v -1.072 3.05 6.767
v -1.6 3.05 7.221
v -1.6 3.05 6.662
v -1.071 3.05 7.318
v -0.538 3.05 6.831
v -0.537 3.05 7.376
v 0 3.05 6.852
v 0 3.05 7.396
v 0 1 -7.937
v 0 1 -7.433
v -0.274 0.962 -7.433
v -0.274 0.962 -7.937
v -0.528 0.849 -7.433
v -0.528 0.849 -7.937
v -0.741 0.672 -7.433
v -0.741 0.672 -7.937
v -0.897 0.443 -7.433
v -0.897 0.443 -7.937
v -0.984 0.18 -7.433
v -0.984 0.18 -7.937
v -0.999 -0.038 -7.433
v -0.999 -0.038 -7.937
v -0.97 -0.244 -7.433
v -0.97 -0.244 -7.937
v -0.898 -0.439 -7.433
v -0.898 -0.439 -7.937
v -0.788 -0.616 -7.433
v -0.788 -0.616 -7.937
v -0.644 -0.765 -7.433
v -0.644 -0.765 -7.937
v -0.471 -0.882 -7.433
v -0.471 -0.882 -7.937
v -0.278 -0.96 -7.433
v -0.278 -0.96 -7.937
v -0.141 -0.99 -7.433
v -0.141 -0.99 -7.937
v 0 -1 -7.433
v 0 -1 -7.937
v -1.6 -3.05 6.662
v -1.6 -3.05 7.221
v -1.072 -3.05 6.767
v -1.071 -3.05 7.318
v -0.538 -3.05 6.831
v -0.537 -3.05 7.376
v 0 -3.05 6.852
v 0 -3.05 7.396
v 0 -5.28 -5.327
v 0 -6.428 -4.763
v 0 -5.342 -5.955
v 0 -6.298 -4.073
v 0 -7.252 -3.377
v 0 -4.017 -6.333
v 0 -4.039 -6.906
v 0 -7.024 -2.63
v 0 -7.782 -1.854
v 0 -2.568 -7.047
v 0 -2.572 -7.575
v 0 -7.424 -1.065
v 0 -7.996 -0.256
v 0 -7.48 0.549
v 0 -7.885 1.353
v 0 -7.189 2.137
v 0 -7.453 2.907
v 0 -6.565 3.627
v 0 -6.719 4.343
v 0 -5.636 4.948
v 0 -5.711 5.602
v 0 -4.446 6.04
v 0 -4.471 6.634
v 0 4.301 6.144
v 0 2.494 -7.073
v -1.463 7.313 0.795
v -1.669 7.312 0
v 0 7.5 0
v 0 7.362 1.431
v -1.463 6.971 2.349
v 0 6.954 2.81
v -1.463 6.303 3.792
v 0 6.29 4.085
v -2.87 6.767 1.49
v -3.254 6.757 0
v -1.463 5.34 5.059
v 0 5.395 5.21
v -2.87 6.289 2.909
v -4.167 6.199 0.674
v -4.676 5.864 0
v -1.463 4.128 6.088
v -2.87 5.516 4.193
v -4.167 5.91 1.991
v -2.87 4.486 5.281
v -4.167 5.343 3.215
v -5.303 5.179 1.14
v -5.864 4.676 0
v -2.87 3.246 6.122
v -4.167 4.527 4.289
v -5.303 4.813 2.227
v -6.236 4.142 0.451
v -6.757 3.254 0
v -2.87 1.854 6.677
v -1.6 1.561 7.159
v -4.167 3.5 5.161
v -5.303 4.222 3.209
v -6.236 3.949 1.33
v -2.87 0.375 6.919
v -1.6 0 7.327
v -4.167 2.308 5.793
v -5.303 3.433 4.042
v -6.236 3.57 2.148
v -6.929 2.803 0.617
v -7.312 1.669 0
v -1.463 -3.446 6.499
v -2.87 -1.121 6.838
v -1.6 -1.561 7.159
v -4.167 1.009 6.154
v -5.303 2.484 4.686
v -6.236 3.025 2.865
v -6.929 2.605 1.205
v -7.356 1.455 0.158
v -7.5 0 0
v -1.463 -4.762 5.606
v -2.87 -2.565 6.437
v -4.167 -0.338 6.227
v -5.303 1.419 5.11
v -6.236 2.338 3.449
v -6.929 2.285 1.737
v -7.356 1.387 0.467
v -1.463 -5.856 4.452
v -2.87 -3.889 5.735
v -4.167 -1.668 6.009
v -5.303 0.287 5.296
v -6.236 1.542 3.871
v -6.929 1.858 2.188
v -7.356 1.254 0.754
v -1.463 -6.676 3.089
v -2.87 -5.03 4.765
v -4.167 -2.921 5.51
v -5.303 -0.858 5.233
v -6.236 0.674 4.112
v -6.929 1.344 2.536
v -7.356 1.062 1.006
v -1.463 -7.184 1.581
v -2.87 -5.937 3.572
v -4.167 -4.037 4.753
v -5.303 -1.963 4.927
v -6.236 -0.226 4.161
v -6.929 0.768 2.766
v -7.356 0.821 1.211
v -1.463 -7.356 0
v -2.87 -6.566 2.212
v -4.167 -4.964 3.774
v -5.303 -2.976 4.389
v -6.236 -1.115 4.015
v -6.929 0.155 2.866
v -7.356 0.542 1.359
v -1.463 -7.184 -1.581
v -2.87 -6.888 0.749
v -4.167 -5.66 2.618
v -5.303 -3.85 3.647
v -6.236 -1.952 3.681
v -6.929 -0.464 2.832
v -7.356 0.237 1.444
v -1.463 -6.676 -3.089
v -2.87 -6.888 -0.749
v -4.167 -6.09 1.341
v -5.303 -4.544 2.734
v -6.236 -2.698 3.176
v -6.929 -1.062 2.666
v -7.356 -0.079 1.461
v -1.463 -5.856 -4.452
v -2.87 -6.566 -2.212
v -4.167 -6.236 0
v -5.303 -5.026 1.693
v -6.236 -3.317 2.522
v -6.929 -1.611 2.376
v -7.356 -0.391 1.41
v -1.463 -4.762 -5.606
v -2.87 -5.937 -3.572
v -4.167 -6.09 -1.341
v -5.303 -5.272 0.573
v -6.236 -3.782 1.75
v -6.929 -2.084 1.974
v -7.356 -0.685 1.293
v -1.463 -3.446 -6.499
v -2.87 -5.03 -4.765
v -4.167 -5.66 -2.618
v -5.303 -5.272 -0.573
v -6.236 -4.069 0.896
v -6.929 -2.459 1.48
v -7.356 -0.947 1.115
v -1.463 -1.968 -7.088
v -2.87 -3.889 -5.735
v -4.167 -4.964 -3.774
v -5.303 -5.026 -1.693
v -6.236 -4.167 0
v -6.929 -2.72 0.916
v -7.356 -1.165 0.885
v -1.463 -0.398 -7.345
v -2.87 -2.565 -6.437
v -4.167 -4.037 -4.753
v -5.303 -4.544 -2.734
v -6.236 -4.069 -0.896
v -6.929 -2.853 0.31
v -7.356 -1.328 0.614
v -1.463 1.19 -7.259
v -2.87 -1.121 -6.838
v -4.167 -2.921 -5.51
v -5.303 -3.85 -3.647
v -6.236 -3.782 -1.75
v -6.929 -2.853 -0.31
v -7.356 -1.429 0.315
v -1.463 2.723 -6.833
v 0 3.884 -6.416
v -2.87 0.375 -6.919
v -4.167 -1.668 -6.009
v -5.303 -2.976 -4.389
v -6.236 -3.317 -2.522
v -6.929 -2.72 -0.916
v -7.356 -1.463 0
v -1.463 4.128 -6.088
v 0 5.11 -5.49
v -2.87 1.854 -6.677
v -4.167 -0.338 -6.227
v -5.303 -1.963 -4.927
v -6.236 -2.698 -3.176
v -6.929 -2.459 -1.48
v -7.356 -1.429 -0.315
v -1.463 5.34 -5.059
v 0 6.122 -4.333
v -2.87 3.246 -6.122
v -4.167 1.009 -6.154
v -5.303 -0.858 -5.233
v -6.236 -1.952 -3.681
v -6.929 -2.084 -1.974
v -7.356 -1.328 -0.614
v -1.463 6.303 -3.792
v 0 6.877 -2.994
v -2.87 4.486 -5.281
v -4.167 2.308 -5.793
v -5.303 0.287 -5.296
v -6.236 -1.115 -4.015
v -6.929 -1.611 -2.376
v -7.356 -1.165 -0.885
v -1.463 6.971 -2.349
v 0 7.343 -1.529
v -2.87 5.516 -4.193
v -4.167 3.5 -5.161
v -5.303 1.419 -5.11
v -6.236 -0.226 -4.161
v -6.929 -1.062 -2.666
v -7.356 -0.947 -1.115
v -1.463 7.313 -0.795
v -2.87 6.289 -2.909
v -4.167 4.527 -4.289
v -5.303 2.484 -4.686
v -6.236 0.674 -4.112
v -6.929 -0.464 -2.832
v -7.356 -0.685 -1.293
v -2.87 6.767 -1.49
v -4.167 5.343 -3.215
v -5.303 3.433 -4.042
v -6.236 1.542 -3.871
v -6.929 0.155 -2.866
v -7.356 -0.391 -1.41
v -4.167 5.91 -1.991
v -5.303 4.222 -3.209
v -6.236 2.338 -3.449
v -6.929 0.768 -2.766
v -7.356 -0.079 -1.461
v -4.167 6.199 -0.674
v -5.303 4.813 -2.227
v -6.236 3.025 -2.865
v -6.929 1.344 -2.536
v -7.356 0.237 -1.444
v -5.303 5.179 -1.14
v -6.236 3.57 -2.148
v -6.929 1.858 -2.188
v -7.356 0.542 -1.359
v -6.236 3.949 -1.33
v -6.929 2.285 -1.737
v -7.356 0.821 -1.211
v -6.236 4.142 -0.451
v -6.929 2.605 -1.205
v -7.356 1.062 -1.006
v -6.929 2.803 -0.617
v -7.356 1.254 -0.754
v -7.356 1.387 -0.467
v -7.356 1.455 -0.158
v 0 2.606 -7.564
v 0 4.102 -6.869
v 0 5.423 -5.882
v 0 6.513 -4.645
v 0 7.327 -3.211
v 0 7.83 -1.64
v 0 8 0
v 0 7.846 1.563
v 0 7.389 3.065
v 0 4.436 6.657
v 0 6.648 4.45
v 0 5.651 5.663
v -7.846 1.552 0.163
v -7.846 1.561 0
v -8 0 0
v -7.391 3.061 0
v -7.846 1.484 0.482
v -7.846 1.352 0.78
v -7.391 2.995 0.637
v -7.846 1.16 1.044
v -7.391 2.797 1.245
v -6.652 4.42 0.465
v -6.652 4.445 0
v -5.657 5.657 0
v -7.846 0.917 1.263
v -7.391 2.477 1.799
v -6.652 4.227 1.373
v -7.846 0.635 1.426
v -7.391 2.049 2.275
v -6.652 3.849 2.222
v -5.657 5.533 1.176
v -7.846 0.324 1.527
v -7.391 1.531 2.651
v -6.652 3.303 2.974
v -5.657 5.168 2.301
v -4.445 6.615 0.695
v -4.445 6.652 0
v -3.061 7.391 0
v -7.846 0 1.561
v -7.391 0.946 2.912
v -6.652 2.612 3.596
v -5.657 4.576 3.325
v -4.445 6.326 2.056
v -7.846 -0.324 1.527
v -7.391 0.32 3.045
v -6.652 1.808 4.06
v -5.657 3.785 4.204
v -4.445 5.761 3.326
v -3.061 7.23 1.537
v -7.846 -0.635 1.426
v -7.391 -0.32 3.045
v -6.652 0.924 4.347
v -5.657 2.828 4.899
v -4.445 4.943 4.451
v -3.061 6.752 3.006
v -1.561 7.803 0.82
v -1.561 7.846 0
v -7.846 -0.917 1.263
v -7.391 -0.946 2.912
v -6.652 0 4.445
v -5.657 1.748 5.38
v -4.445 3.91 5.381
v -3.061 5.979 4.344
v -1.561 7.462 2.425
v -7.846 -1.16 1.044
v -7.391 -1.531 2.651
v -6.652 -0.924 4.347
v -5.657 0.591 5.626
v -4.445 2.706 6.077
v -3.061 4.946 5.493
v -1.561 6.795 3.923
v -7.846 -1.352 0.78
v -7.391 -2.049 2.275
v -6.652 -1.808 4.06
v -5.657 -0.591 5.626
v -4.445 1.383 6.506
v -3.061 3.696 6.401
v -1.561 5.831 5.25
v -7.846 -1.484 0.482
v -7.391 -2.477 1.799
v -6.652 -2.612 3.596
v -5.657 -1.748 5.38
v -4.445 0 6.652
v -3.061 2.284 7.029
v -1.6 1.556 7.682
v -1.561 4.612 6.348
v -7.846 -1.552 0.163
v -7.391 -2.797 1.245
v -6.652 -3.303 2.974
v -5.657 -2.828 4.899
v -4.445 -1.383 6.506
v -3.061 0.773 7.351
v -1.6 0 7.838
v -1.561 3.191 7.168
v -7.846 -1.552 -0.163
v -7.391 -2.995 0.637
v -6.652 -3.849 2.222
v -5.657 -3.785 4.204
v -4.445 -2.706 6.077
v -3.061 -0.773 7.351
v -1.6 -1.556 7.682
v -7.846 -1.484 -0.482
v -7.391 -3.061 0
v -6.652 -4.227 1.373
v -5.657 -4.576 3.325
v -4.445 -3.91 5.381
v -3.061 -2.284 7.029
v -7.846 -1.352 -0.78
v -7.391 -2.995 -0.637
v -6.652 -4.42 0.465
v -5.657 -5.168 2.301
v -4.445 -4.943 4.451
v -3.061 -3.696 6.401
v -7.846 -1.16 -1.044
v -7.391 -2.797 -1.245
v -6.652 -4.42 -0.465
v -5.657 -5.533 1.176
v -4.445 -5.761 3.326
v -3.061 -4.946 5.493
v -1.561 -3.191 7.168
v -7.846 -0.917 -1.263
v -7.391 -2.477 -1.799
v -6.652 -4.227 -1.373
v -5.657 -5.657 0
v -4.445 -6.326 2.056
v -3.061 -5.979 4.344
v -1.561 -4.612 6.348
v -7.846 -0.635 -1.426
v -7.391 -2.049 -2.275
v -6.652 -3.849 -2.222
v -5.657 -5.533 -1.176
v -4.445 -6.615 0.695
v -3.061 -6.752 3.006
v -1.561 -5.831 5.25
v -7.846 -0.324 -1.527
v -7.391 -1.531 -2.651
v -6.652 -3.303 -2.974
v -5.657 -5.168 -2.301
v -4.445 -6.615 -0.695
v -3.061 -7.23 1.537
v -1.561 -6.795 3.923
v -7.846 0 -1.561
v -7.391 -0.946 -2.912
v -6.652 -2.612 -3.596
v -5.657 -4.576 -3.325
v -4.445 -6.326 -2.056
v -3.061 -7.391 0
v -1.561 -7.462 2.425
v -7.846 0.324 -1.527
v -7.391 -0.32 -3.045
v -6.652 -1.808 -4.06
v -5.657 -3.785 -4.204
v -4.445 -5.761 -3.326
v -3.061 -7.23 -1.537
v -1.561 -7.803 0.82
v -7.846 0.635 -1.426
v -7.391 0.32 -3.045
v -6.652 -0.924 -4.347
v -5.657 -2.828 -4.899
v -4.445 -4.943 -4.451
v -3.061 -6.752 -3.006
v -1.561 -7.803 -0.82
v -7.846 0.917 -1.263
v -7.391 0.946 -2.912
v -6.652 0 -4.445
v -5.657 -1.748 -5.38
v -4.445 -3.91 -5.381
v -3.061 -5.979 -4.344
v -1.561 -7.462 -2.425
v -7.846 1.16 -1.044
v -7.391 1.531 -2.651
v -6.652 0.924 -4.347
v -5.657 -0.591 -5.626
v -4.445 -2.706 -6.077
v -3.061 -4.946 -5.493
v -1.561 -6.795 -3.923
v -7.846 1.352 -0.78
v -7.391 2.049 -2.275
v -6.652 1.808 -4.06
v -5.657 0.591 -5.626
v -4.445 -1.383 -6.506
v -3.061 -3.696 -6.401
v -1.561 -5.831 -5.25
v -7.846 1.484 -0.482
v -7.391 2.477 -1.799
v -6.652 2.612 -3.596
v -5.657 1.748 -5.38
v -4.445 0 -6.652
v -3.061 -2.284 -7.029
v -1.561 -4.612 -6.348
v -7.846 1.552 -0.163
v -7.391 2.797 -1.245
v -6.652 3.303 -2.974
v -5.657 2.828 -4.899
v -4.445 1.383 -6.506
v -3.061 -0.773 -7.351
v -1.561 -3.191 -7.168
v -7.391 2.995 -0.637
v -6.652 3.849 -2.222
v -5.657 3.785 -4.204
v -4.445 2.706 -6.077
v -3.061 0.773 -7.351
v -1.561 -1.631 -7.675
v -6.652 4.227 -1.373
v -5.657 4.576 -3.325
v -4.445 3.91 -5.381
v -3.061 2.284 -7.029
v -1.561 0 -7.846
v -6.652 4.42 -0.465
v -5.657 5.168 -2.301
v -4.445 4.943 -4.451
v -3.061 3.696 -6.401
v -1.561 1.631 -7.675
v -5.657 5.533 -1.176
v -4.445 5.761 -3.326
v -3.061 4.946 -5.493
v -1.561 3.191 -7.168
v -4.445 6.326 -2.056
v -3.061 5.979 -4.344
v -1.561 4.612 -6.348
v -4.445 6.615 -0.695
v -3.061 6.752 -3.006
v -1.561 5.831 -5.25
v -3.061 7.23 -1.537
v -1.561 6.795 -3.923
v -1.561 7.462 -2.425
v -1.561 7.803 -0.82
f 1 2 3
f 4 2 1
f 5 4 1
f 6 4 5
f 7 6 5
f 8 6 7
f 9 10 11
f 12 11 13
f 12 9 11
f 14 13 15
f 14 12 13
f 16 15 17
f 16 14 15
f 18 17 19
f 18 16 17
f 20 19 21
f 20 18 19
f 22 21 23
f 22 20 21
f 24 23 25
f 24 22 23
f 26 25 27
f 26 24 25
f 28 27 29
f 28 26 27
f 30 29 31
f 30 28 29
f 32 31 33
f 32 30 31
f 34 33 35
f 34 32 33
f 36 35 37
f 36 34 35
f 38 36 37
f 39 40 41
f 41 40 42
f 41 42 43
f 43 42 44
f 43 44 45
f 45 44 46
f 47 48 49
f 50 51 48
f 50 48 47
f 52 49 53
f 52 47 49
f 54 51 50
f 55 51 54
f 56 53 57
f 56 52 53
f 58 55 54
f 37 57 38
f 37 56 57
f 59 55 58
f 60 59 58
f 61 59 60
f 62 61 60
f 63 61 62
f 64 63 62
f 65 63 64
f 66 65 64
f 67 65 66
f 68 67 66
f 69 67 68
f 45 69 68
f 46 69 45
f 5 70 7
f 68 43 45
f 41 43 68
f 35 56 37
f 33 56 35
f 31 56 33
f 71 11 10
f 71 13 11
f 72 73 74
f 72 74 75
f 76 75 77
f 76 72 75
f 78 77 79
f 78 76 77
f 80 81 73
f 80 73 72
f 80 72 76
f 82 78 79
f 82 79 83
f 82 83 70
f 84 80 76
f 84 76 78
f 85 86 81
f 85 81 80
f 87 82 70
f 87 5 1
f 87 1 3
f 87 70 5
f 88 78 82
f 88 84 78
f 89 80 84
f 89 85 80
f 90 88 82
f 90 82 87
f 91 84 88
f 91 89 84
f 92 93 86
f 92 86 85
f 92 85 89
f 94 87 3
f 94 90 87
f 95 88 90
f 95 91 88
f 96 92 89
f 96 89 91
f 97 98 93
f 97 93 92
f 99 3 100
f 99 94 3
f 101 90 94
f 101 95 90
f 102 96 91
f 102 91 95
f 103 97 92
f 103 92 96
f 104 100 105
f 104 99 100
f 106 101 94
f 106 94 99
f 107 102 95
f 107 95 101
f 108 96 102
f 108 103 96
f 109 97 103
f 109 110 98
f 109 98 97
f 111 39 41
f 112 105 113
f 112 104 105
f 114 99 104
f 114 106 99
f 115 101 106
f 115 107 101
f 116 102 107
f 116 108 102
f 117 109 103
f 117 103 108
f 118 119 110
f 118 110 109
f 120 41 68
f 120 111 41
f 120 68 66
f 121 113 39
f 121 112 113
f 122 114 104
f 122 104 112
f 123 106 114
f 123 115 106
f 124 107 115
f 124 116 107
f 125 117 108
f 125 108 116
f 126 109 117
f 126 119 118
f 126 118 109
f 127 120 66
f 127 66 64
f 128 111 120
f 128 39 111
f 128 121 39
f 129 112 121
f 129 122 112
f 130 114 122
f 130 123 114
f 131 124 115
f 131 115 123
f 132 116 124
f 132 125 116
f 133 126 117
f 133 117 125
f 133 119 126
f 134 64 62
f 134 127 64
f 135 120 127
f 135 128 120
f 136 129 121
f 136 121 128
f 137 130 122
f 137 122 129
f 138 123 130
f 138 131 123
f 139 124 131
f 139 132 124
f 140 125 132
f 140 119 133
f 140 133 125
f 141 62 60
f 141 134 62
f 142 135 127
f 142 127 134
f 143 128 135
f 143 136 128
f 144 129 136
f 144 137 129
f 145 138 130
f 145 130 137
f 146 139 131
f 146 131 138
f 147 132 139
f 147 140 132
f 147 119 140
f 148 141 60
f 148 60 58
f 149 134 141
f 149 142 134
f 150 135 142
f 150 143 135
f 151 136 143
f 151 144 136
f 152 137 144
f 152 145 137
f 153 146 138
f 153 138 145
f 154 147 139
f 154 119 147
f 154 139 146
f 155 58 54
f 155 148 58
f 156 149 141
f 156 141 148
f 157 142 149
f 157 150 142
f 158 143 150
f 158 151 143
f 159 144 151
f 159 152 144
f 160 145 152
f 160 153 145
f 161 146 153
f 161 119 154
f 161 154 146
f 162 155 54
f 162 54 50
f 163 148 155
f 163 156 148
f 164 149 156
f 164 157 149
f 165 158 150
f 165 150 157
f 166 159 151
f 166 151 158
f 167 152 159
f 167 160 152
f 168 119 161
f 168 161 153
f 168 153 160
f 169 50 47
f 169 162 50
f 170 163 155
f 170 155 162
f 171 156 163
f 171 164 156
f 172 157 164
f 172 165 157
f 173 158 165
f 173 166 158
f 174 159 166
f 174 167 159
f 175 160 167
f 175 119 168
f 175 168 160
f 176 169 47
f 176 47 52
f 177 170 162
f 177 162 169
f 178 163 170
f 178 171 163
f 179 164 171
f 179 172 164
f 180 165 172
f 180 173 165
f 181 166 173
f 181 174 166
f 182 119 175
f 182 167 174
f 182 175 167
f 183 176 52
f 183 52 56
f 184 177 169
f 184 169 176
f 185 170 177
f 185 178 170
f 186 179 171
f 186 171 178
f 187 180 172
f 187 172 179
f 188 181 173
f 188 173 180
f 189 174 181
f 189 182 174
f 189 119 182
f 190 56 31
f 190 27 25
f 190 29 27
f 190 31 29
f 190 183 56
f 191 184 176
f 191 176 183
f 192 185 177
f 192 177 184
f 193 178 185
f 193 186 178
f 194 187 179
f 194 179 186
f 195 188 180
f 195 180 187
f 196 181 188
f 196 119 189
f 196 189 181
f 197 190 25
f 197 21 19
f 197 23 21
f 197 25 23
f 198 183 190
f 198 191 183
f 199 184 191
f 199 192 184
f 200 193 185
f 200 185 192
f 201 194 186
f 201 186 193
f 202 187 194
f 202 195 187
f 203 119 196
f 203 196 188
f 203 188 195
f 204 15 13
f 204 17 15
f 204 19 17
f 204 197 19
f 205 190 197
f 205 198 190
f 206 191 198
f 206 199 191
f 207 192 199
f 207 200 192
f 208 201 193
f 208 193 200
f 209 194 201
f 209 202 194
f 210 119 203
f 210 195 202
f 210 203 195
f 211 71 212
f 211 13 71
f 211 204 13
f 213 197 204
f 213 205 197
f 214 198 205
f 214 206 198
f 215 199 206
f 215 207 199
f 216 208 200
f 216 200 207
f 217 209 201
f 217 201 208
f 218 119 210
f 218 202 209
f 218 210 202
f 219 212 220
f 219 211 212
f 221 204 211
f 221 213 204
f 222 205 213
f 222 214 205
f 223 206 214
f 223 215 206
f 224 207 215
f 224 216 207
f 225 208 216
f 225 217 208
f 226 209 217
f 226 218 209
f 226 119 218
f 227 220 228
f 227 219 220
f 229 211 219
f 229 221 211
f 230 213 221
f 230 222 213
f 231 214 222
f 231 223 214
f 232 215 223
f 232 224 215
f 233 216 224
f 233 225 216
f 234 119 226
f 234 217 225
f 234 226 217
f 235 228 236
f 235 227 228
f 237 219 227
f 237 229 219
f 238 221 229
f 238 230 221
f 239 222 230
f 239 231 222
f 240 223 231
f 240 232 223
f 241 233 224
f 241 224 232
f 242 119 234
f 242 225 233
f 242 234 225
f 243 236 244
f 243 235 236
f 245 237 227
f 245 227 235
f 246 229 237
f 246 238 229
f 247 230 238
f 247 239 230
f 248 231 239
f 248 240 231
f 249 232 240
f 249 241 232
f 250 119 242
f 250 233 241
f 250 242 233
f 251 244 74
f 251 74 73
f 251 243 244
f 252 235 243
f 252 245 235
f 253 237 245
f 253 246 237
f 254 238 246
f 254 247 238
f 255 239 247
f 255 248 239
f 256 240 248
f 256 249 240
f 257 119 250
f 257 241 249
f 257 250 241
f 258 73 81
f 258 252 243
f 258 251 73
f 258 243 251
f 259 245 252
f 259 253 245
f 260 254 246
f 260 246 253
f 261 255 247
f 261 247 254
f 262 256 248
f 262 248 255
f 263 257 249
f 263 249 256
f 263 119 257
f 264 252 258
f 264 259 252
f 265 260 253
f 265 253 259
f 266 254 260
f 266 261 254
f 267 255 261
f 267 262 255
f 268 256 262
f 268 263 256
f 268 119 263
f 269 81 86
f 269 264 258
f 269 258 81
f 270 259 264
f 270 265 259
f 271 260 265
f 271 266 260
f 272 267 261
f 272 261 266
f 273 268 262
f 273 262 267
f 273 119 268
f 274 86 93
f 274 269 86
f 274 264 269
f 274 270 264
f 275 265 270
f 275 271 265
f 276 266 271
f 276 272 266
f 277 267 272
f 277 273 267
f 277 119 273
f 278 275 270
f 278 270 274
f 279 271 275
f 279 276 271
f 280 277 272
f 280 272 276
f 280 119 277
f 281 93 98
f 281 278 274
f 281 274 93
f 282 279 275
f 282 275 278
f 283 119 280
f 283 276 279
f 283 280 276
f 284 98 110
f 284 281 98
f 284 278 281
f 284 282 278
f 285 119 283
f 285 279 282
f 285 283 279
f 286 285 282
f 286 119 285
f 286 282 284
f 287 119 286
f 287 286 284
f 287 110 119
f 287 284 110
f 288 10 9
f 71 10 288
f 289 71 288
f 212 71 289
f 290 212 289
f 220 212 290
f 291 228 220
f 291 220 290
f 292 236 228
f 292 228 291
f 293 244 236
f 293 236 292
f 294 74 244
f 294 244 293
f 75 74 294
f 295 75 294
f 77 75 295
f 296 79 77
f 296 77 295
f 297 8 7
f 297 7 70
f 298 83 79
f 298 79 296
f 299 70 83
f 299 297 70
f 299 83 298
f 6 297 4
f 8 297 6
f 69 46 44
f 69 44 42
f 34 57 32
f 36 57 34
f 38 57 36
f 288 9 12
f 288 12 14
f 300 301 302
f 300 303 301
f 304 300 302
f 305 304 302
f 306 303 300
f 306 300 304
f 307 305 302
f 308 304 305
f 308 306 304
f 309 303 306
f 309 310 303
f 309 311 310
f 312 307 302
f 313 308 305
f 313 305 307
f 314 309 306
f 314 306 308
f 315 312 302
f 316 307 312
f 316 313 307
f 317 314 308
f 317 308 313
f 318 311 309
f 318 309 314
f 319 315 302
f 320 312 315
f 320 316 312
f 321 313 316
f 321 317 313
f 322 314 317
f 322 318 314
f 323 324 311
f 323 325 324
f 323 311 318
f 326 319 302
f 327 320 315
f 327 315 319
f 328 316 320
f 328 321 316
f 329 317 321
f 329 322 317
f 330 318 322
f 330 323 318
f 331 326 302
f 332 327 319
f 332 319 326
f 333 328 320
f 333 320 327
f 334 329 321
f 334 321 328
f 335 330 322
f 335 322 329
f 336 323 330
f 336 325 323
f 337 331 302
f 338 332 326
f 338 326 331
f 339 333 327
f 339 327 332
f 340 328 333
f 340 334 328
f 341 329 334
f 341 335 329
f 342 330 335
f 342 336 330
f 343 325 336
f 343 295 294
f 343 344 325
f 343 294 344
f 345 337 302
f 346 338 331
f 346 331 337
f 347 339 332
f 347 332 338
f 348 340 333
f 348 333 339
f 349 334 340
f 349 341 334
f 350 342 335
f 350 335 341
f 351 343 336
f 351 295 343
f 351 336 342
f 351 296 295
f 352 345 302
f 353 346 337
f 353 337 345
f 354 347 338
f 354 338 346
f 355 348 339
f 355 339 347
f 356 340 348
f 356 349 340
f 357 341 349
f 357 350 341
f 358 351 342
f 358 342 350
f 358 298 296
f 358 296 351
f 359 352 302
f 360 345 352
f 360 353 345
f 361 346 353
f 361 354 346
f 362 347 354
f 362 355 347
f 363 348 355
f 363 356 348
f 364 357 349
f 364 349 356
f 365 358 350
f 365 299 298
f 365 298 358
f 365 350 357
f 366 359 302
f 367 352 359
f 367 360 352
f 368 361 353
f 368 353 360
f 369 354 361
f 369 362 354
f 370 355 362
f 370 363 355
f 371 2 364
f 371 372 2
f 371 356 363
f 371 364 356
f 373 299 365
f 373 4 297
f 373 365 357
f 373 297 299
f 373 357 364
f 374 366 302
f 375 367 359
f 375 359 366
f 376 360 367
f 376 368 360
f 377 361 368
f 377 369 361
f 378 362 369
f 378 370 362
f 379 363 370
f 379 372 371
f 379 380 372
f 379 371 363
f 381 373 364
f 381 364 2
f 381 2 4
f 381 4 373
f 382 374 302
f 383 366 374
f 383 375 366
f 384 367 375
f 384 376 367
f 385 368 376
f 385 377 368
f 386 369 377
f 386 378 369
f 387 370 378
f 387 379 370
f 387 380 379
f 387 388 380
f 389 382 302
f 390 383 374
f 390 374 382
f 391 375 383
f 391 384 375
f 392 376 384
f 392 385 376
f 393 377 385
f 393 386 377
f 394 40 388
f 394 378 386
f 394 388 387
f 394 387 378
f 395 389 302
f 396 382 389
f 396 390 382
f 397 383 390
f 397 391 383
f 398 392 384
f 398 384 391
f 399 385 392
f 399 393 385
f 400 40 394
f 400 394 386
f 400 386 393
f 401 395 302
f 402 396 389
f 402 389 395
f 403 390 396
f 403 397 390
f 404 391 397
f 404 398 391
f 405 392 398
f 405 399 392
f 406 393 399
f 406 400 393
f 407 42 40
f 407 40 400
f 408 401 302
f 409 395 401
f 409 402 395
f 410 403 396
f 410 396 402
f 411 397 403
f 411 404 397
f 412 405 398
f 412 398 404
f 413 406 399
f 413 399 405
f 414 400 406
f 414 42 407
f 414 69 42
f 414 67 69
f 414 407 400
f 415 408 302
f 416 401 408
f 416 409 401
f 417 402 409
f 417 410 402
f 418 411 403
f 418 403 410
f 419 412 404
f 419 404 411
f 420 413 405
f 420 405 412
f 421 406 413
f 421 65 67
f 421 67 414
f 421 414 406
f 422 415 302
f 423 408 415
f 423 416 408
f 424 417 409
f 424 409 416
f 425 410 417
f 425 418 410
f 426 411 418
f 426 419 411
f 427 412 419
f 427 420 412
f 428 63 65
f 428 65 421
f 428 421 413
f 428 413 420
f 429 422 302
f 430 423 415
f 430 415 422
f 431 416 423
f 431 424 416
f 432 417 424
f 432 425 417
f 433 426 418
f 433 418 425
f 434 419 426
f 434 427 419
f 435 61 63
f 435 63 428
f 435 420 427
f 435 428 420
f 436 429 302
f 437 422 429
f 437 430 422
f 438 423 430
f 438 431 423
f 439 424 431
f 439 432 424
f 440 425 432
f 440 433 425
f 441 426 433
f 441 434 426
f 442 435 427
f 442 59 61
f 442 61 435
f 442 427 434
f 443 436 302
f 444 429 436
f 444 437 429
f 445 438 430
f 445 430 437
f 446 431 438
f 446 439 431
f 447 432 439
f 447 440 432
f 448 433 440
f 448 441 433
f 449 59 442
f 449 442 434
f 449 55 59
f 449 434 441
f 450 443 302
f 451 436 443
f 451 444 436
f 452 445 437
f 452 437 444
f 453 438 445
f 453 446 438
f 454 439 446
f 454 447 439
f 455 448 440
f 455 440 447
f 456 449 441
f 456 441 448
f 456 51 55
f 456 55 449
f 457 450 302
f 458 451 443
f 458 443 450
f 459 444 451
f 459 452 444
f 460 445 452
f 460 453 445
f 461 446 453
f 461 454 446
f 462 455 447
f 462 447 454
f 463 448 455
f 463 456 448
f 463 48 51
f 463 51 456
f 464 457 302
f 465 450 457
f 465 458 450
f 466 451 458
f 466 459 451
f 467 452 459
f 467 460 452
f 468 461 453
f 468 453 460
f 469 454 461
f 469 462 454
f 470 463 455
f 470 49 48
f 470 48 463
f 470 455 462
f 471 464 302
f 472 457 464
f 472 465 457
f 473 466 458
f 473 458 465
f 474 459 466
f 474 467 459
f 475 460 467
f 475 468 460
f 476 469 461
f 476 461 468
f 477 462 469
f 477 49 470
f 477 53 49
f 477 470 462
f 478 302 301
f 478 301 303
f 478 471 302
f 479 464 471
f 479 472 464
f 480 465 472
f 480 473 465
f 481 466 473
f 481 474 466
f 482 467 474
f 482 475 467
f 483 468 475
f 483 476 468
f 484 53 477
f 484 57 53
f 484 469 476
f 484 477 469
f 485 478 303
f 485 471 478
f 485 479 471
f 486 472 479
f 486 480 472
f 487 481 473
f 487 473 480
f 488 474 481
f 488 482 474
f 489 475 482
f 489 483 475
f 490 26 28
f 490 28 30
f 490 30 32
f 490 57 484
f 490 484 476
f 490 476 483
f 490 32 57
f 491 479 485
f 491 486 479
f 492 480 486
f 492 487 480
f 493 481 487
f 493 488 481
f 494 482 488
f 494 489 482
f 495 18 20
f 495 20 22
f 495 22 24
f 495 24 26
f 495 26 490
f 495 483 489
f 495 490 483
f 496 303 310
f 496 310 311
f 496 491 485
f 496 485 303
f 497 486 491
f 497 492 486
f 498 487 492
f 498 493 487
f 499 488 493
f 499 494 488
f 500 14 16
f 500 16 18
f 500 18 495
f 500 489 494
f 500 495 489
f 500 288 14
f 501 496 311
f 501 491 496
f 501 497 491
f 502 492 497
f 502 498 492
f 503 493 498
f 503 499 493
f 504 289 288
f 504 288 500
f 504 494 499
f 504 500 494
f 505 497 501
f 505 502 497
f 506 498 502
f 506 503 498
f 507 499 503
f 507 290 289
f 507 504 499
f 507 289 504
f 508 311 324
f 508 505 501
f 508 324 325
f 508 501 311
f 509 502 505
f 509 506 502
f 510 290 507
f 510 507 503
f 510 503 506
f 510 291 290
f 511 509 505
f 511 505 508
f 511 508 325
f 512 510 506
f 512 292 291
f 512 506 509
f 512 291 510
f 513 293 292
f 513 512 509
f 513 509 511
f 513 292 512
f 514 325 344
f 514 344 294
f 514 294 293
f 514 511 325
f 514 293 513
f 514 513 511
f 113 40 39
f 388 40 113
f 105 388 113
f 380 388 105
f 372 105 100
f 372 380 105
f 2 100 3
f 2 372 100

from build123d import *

# Parameters (mm, degrees)
SKETCH2_W          = 3.2
SKETCH2_H          = 6.1
CUT_EXTRUDE1_DEPTH = 2
CUT_EXTRUDE2_REACH = 17.838
SKETCH3_R          = 1


with BuildPart() as part:
    # Sketch1 → Revolve1 (revolve)
    with BuildSketch(Plane.XY):
        with BuildLine():
            Line((0, 8), (0, 7.5))
            ThreePointArc((0, 7.5), (-5.303300859, 5.303300859), (-7.5, 0))
            Line((-7.5, 0), (-8, 0))
            ThreePointArc((-8, 0), (-5.656854249, 5.656854249), (0, 8))
        make_face()
    revolve(axis=Axis((-8, 0, 0), (1, 0, 0)))

    # Sketch2 → Cut-Extrude1 (cut)
    with BuildSketch(Plane.XY.offset(8)):
        Rectangle(SKETCH2_W, SKETCH2_H)
    extrude(amount=-CUT_EXTRUDE1_DEPTH, mode=Mode.SUBTRACT)

    # Sketch3 → Cut-Extrude2 (cut, up to next)
    with BuildSketch(Plane.XY.offset(-8), mode=Mode.PRIVATE) as cut_extrude2_sk1:
        Circle(SKETCH3_R)
    cut_extrude2_tool1 = extrude(cut_extrude2_sk1.sketch, amount=CUT_EXTRUDE2_REACH, mode=Mode.PRIVATE) & part.part
    add(cut_extrude2_tool1.solids().sort_by_distance((0, 0, -8))[0], mode=Mode.SUBTRACT)


solid = part.part
